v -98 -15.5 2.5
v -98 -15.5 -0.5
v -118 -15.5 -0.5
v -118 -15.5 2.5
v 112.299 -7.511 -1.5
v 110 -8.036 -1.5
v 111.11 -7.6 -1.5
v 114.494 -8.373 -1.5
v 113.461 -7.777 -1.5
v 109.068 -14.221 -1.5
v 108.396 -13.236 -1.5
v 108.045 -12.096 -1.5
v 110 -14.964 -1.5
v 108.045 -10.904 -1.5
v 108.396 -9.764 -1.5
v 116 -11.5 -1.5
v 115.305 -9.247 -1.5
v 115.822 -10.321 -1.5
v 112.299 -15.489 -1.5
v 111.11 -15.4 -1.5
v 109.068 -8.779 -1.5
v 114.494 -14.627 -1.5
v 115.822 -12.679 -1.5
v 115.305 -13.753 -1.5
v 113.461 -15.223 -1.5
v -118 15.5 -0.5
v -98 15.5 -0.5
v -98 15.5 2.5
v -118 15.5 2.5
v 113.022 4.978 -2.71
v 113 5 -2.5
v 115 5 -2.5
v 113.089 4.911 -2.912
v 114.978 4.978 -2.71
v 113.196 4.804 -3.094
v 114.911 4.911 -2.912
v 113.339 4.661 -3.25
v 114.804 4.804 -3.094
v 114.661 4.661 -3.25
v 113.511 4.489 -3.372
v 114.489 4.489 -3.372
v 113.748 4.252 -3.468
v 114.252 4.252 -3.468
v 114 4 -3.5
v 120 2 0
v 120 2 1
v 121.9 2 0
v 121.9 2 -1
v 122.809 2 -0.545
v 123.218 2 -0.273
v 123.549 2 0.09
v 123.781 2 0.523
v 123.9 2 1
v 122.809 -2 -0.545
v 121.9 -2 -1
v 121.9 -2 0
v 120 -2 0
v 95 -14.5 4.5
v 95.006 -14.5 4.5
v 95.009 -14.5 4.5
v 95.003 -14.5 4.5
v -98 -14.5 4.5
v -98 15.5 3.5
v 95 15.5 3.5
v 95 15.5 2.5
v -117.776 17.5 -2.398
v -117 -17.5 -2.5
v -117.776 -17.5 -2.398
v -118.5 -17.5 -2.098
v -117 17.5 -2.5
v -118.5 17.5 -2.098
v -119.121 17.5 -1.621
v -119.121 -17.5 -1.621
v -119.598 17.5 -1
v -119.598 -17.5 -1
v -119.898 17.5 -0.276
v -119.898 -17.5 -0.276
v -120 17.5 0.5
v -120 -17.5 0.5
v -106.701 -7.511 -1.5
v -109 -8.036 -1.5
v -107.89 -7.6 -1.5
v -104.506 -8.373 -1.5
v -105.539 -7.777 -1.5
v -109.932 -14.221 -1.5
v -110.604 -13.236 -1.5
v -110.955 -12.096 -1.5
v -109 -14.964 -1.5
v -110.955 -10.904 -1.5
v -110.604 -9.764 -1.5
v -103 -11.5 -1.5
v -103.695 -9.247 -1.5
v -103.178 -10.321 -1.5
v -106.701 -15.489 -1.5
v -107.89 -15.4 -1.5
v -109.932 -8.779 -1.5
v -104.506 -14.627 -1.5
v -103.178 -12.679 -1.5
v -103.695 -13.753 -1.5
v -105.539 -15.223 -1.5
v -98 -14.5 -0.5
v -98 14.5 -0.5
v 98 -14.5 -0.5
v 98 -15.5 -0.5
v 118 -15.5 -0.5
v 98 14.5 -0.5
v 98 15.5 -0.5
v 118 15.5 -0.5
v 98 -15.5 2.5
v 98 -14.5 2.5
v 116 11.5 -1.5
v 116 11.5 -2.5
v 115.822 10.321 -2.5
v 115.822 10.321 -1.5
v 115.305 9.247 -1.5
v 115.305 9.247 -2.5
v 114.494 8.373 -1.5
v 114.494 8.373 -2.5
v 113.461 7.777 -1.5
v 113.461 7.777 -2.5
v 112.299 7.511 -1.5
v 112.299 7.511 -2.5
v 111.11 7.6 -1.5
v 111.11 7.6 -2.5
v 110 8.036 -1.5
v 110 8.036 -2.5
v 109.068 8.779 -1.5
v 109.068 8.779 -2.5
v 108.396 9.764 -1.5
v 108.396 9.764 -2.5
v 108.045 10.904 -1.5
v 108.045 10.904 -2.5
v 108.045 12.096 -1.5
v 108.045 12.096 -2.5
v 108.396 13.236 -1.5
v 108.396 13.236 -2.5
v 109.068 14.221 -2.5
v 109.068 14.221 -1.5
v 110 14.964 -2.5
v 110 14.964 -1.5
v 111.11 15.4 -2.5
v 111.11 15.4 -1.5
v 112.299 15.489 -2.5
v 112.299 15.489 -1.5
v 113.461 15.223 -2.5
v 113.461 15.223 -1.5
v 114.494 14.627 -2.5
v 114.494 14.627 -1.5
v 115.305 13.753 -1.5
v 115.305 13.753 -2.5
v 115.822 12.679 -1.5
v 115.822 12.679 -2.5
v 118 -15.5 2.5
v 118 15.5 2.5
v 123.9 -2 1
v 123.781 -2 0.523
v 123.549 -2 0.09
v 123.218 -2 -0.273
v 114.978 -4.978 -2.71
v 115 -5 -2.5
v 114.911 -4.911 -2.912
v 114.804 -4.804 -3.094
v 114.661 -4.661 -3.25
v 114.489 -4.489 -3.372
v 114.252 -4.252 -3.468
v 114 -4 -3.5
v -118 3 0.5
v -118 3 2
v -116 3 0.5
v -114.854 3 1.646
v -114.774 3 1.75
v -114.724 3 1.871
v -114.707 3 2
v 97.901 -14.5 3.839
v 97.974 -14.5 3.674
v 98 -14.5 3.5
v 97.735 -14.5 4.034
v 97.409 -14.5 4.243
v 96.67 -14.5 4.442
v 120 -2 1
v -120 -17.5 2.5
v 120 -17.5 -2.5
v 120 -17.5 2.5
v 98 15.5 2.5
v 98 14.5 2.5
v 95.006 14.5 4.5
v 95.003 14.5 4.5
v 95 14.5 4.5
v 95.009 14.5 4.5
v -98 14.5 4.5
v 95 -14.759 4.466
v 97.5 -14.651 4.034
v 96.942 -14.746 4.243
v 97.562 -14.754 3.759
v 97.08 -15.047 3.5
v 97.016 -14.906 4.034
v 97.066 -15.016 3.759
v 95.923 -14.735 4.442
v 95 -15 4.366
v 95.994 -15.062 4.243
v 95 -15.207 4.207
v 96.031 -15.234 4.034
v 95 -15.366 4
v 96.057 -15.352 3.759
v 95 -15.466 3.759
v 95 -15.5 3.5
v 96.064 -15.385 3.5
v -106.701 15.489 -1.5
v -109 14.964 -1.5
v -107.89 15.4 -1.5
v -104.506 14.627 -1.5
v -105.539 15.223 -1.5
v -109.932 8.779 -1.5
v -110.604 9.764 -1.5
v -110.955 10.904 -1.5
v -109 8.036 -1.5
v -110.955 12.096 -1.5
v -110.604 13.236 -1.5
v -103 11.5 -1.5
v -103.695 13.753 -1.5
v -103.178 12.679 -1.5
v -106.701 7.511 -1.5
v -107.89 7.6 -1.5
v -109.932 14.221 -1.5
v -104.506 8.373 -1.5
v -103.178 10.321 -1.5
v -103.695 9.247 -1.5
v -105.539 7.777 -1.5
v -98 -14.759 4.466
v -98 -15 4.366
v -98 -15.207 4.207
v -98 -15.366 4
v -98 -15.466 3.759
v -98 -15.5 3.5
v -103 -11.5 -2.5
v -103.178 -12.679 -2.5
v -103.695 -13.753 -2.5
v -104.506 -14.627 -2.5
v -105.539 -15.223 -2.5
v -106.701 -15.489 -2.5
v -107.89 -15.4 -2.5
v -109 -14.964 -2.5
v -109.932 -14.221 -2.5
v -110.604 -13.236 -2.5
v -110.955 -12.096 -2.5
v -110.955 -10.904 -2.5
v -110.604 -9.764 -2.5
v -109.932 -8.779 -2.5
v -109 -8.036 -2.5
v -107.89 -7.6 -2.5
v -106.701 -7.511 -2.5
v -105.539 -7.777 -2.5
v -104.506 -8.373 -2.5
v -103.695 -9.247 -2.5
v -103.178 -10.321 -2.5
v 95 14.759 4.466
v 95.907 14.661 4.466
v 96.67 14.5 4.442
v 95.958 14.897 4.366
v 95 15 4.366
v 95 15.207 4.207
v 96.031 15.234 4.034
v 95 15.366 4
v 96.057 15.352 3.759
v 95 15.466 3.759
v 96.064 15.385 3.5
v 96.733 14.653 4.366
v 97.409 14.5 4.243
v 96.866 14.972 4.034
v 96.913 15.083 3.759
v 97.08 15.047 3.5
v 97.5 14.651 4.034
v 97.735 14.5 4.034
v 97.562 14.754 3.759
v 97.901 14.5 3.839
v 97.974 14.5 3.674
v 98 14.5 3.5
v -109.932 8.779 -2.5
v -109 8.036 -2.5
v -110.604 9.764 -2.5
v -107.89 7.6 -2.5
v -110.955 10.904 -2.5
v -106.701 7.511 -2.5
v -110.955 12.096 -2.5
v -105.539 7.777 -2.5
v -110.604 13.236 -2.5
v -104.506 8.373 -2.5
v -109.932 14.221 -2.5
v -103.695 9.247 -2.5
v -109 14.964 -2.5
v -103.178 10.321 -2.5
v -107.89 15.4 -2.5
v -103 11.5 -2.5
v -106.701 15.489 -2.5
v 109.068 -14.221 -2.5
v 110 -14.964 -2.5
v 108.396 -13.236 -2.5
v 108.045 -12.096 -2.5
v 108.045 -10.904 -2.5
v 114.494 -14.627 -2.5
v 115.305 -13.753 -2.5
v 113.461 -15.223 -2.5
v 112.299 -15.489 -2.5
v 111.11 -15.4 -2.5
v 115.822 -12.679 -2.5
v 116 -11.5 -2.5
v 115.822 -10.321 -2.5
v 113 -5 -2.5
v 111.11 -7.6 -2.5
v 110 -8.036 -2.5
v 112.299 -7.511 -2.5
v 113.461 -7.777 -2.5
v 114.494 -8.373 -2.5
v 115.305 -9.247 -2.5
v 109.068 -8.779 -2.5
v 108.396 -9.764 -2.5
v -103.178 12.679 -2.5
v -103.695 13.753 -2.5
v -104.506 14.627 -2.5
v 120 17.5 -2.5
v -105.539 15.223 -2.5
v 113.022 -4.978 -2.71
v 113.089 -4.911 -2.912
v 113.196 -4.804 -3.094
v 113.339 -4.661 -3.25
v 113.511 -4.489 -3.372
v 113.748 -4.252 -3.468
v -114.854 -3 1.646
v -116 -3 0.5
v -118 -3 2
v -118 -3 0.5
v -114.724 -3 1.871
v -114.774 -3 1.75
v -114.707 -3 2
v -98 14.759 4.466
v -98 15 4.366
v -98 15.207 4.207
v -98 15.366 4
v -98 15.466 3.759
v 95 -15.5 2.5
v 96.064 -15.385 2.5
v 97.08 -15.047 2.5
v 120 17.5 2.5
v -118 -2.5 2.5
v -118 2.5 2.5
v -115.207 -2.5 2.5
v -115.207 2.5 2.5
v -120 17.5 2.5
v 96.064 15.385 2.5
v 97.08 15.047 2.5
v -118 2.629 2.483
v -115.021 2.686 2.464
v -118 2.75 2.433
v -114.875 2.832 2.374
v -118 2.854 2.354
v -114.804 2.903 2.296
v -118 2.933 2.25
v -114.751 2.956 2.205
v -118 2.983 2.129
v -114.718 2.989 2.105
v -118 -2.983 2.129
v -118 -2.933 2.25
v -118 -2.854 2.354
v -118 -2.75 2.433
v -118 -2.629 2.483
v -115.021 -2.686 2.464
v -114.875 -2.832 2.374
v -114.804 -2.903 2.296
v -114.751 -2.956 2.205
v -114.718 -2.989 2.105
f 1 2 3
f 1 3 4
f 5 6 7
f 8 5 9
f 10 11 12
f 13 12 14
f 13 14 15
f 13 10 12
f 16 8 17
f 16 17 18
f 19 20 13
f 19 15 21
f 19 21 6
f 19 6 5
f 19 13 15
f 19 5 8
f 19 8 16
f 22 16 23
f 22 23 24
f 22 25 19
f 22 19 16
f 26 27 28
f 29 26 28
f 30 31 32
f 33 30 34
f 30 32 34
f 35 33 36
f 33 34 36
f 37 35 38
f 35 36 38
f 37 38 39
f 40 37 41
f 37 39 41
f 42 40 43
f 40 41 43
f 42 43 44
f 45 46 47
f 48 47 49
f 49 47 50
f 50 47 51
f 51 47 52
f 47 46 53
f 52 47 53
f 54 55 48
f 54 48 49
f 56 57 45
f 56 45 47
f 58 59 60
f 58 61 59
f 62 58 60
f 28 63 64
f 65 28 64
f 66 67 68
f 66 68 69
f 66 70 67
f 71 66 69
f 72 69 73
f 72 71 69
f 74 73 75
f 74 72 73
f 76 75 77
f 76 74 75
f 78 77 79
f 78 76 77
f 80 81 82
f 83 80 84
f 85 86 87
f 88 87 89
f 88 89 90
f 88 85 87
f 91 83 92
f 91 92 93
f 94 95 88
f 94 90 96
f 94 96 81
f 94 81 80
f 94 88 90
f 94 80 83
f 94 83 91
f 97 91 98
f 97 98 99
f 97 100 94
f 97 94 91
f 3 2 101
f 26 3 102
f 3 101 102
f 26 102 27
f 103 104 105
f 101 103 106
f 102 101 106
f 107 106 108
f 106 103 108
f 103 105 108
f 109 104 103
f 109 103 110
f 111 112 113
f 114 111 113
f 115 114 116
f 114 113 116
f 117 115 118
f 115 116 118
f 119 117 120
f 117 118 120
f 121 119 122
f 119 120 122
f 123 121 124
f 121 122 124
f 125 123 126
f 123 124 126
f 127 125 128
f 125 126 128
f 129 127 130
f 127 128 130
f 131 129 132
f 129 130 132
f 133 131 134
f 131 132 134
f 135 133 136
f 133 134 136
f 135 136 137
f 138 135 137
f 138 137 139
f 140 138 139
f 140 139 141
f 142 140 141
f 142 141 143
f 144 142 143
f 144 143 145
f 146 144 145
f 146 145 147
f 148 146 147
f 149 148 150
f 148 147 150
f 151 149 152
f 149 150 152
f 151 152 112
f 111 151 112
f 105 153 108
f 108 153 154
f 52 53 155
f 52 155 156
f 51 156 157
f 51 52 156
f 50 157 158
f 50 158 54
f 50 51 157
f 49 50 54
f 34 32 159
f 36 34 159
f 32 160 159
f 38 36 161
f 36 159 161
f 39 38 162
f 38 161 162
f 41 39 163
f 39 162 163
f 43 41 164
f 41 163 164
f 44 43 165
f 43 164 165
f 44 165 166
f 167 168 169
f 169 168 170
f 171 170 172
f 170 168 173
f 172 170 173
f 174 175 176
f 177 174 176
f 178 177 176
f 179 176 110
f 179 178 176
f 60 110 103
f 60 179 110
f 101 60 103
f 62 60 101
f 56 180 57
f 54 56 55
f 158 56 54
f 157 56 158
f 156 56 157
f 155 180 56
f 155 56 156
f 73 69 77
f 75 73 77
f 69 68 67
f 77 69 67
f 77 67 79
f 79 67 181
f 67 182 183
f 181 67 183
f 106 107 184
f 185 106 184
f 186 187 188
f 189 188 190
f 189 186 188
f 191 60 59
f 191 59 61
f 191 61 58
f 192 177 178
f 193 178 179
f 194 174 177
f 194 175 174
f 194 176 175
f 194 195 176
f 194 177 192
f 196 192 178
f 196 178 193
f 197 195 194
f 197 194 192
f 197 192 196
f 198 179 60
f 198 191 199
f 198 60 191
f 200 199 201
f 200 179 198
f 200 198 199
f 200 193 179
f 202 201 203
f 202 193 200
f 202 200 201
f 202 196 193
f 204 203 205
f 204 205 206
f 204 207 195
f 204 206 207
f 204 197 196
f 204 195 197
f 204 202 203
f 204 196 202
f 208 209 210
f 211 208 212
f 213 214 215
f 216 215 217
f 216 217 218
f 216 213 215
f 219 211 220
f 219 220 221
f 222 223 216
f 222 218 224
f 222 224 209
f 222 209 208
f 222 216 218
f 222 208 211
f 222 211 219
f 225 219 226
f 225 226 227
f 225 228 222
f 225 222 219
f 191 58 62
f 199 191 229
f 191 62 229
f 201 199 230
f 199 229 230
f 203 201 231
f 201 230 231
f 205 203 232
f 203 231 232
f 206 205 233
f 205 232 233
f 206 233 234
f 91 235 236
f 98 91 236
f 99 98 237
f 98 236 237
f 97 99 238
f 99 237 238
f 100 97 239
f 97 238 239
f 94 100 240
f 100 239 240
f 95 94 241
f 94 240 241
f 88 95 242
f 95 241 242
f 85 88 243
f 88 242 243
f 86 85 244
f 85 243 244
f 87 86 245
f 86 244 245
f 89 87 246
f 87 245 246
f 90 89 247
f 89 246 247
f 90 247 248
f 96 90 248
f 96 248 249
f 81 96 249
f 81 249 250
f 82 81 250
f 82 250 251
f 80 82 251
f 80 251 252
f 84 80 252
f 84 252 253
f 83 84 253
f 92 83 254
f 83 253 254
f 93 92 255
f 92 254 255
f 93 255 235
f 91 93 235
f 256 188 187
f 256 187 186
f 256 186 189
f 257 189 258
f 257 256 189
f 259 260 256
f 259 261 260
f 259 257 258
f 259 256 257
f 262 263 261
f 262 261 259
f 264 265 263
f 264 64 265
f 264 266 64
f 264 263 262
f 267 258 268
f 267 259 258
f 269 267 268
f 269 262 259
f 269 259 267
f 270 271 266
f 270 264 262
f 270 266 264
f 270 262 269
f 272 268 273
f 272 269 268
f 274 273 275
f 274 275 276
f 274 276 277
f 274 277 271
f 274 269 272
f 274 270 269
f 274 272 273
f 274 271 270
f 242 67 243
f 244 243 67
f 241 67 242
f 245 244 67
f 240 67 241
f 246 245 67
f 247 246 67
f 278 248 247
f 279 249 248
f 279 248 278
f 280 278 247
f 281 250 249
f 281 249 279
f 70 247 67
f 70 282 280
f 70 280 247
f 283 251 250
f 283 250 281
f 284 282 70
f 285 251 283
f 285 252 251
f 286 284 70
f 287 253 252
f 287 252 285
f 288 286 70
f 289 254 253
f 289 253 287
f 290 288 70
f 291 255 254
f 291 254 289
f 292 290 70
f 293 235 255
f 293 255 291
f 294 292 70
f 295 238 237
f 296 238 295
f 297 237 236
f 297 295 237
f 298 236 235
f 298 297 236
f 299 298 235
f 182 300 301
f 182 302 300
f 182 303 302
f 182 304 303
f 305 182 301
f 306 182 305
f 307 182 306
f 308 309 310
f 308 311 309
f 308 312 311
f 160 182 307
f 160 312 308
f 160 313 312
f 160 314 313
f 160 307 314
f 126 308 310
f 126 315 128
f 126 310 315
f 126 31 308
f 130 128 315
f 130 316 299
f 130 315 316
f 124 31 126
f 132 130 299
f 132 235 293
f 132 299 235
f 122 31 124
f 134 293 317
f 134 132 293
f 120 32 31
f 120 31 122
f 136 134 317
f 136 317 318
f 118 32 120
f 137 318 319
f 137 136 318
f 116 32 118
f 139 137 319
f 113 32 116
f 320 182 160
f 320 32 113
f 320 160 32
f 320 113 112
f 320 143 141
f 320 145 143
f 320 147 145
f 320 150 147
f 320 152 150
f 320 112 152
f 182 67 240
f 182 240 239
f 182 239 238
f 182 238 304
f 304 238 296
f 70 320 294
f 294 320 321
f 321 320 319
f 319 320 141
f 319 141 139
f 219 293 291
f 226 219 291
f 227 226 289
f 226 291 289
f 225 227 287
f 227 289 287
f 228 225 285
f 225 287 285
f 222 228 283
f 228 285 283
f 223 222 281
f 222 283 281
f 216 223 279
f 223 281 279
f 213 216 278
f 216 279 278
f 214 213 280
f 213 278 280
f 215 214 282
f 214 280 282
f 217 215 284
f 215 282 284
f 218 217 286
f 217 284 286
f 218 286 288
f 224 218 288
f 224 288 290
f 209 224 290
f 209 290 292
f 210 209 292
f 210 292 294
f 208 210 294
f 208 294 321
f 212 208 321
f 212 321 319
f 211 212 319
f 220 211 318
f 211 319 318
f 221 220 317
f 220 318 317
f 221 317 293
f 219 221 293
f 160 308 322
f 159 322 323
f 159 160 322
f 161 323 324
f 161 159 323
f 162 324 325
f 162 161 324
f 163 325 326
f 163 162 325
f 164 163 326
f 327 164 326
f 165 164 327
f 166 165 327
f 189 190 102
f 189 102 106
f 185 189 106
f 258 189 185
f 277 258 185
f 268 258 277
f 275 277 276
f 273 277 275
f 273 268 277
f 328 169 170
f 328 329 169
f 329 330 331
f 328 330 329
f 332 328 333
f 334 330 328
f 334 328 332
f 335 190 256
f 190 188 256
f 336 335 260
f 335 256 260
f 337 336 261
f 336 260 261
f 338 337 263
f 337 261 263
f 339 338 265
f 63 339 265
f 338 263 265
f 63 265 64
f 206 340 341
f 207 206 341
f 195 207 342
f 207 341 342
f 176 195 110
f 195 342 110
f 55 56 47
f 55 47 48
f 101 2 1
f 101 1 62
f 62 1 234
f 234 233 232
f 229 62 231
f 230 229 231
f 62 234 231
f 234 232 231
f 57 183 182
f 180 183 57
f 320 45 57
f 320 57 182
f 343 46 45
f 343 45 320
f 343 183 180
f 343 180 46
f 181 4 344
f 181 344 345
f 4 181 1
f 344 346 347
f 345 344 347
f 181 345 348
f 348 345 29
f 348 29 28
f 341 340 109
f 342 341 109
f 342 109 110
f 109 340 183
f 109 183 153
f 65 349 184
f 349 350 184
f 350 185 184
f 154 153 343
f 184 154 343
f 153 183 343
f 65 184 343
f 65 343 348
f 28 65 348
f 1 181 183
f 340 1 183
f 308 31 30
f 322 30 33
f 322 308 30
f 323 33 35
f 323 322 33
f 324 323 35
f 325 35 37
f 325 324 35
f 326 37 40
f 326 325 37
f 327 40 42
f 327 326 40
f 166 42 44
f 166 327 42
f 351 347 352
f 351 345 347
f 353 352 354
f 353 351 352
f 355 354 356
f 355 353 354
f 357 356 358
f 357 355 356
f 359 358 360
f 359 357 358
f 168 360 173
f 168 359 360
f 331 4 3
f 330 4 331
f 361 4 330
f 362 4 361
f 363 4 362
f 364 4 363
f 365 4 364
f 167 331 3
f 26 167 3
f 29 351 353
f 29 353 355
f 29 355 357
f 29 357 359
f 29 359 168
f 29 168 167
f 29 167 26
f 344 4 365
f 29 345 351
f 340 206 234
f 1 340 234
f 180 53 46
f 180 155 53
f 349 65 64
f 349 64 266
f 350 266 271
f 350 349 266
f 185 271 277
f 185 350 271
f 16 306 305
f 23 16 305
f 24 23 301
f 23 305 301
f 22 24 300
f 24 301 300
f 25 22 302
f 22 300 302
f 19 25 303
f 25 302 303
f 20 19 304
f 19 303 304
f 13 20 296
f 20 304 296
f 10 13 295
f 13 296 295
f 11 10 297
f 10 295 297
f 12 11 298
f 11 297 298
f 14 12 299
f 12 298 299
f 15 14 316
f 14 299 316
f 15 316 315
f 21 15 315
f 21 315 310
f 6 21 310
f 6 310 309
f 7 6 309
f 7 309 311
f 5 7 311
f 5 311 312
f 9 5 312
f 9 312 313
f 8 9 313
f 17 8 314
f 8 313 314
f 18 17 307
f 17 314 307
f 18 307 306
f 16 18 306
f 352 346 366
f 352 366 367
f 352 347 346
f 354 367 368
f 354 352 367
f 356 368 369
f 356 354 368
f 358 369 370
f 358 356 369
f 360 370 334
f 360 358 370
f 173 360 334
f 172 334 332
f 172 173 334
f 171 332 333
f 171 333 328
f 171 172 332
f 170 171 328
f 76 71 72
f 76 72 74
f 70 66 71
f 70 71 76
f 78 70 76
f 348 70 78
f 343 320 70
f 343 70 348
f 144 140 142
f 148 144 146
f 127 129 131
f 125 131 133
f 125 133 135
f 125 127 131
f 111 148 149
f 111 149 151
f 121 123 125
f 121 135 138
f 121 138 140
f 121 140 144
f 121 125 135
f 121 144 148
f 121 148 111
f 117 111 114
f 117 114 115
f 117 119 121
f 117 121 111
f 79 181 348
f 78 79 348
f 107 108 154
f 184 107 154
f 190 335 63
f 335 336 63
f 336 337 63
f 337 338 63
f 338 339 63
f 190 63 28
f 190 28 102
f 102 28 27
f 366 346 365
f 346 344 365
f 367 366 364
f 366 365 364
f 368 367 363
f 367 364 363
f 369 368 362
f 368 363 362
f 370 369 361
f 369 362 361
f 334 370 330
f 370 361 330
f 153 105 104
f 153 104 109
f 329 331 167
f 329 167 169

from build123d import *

# Parameters (mm, degrees)
F0_W         = 35
F0_H         = 5
F1_DEPTH     = 120
F2_T         = -2
F4_DEPTH     = 3
F6_DEPTH     = 2
F7_T1_DEPTH  = 10.0971618345
F8_W         = 196
F8_H         = 5
F9_DEPTH     = 1
F10_W        = 196
F10_H        = 2
F10_H_2      = 3
F11_DEPTH    = 1
F12_T1_DEPTH = 9.5
F13_R        = 0.99999
F14_R        = 0.5
F15_R        = 4
F16_DEPTH    = 1
F17_W        = 2
F17_H        = 10
F18_DEPTH    = 1
F19_R        = 0.99999
F20_R        = 3


# Not quite as in the source:
# - a fillet or chamfer that OpenCascade refuses, or shapes differently, is made with other operations: its cross-section is extruded or revolved along the edge and cut away or added
# - a fillet or chamfer is up to 0.001 mm smaller than in the source, because OpenCascade refuses the exact size


with BuildPart() as f1:
    # F0 (on Right) → F1 (new body, symmetric)
    with BuildSketch(Plane.YZ):
        Rectangle(F0_W, F0_H)
    extrude(amount=F1_DEPTH, both=True)

    # F2
    f2_openings = [f1.faces().sort_by_distance(p)[0] for p in [
        (0, 0, 2.5),
    ]]
    offset(amount=F2_T, openings=f2_openings)

    # F3 (on Front) → F4 (join, symmetric)
    with BuildSketch(Plane.XZ):
        Polygon((-114, 2.5), (-118, 2.5), (-118, 0.5), (-116, 0.5), align=None)
    extrude(amount=F4_DEPTH, both=True)

    # F5 (on Front) → F6 (join, symmetric)
    with BuildSketch(Plane.XZ):
        Polygon((123.9, 1), (120, 1), (120, 0), (121.9, 0), (123.9, 0), align=None)
        Polygon((121.9, -1), (123.9, 0), (121.9, 0), align=None)
    extrude(amount=F6_DEPTH, both=True)

    # F7: fillet of radius 2 on 1 edges, made by hand

    # F7_s2 → F7_t1 (cut)
    with BuildSketch(Plane.XZ.offset(-5.0485809173)):
        with BuildLine():
            ThreePointArc((123.9, 1), (123.5488845703, 0.09023972), (122.8093065335, -0.5453467333))
            Line((122.8093065335, -0.5453467333), (123.9, 0))
            Line((123.9, 0), (123.9, 1))
        make_face()
    extrude(amount=F7_T1_DEPTH, mode=Mode.SUBTRACT)

    # F8 (on face) → F9 (join)
    with BuildSketch(Plane(origin=(0, -15.5, 0), x_dir=(-1, 0, 0), z_dir=(0, 1, 0))):
        with Locations((0, 2)):
            Rectangle(F8_W, F8_H)
    extrude(amount=F9_DEPTH)

    # F10 (on face) → F11 (join)
    with BuildSketch(Plane.XZ.offset(-15.5)):
        with Locations((0, 3.5)):
            Rectangle(F10_W, F10_H)
        with Locations((0, 1)):
            Rectangle(F10_W, F10_H_2)
    extrude(amount=F11_DEPTH)

    # F12: fillet of radius 5 on 2 edges, made by hand

    # F12_s2 → F12_t1 (cut)
    with BuildSketch(Plane.XY.offset(2.5)):
        with BuildLine():
            ThreePointArc((95, 15.5), (96.5811388301, 15.2434164903), (98, 14.5))
            Line((98, 14.5), (98, 15.5))
            Line((98, 15.5), (95, 15.5))
        make_face()
        with BuildLine():
            ThreePointArc((95, -15.5), (96.5811388301, -15.2434164903), (98, -14.5))
            Line((98, -14.5), (98, -15.5))
            Line((98, -15.5), (95, -15.5))
        make_face()
    extrude(amount=F12_T1_DEPTH, mode=Mode.SUBTRACT)

    # F13 (radius 1 in the source; OpenCascade refuses exactly that, so slightly less here)
    f13_edges = [f1.edges().sort_by_distance(p)[0] for p in [
        (-1.5, -15.5, 4.5),
        (-1.5, 15.5, 4.5),
    ]]
    fillet(f13_edges, radius=F13_R)

    # F14
    f14_edges = [f1.edges().sort_by_distance(p)[0] for p in [
        (-114, 0, 2.5),
        (-116, -3, 2.5),
        (-116, 3, 2.5),
    ]]
    fillet(f14_edges, radius=F14_R)

    # F15 (on face) → F16 (cut)
    with BuildSketch(Plane(origin=(0, 0, -2.5), x_dir=(1, 0, 0), z_dir=(0, 0, -1))):
        with Locations((-107, 11.5)):
            Circle(F15_R)
        with Locations((-107, -11.5)):
            Circle(F15_R)
        with Locations((112, -11.5)):
            Circle(F15_R)
        with Locations((112, 11.5)):
            Circle(F15_R)
    extrude(amount=-F16_DEPTH, mode=Mode.SUBTRACT)

    # F17 (on face) → F18 (join)
    with BuildSketch(Plane(origin=(0, 0, -2.5), x_dir=(1, 0, 0), z_dir=(0, 0, -1))):
        with Locations((114, 0)):
            Rectangle(F17_W, F17_H)
    extrude(amount=F18_DEPTH)

    # F19 (radius 1 in the source; OpenCascade refuses exactly that, so slightly less here)
    f19_edges = [f1.edges().sort_by_distance(p)[0] for p in [
        (114, -5, -3.5),
        (115, 0, -3.5),
        (114, 5, -3.5),
        (113, 0, -3.5),
    ]]
    fillet(f19_edges, radius=F19_R)

    # F20
    f20_edges = [f1.edges().sort_by_distance(p)[0] for p in [
        (-120, 0, -2.5),
    ]]
    fillet(f20_edges, radius=F20_R)


solid = f1.part
